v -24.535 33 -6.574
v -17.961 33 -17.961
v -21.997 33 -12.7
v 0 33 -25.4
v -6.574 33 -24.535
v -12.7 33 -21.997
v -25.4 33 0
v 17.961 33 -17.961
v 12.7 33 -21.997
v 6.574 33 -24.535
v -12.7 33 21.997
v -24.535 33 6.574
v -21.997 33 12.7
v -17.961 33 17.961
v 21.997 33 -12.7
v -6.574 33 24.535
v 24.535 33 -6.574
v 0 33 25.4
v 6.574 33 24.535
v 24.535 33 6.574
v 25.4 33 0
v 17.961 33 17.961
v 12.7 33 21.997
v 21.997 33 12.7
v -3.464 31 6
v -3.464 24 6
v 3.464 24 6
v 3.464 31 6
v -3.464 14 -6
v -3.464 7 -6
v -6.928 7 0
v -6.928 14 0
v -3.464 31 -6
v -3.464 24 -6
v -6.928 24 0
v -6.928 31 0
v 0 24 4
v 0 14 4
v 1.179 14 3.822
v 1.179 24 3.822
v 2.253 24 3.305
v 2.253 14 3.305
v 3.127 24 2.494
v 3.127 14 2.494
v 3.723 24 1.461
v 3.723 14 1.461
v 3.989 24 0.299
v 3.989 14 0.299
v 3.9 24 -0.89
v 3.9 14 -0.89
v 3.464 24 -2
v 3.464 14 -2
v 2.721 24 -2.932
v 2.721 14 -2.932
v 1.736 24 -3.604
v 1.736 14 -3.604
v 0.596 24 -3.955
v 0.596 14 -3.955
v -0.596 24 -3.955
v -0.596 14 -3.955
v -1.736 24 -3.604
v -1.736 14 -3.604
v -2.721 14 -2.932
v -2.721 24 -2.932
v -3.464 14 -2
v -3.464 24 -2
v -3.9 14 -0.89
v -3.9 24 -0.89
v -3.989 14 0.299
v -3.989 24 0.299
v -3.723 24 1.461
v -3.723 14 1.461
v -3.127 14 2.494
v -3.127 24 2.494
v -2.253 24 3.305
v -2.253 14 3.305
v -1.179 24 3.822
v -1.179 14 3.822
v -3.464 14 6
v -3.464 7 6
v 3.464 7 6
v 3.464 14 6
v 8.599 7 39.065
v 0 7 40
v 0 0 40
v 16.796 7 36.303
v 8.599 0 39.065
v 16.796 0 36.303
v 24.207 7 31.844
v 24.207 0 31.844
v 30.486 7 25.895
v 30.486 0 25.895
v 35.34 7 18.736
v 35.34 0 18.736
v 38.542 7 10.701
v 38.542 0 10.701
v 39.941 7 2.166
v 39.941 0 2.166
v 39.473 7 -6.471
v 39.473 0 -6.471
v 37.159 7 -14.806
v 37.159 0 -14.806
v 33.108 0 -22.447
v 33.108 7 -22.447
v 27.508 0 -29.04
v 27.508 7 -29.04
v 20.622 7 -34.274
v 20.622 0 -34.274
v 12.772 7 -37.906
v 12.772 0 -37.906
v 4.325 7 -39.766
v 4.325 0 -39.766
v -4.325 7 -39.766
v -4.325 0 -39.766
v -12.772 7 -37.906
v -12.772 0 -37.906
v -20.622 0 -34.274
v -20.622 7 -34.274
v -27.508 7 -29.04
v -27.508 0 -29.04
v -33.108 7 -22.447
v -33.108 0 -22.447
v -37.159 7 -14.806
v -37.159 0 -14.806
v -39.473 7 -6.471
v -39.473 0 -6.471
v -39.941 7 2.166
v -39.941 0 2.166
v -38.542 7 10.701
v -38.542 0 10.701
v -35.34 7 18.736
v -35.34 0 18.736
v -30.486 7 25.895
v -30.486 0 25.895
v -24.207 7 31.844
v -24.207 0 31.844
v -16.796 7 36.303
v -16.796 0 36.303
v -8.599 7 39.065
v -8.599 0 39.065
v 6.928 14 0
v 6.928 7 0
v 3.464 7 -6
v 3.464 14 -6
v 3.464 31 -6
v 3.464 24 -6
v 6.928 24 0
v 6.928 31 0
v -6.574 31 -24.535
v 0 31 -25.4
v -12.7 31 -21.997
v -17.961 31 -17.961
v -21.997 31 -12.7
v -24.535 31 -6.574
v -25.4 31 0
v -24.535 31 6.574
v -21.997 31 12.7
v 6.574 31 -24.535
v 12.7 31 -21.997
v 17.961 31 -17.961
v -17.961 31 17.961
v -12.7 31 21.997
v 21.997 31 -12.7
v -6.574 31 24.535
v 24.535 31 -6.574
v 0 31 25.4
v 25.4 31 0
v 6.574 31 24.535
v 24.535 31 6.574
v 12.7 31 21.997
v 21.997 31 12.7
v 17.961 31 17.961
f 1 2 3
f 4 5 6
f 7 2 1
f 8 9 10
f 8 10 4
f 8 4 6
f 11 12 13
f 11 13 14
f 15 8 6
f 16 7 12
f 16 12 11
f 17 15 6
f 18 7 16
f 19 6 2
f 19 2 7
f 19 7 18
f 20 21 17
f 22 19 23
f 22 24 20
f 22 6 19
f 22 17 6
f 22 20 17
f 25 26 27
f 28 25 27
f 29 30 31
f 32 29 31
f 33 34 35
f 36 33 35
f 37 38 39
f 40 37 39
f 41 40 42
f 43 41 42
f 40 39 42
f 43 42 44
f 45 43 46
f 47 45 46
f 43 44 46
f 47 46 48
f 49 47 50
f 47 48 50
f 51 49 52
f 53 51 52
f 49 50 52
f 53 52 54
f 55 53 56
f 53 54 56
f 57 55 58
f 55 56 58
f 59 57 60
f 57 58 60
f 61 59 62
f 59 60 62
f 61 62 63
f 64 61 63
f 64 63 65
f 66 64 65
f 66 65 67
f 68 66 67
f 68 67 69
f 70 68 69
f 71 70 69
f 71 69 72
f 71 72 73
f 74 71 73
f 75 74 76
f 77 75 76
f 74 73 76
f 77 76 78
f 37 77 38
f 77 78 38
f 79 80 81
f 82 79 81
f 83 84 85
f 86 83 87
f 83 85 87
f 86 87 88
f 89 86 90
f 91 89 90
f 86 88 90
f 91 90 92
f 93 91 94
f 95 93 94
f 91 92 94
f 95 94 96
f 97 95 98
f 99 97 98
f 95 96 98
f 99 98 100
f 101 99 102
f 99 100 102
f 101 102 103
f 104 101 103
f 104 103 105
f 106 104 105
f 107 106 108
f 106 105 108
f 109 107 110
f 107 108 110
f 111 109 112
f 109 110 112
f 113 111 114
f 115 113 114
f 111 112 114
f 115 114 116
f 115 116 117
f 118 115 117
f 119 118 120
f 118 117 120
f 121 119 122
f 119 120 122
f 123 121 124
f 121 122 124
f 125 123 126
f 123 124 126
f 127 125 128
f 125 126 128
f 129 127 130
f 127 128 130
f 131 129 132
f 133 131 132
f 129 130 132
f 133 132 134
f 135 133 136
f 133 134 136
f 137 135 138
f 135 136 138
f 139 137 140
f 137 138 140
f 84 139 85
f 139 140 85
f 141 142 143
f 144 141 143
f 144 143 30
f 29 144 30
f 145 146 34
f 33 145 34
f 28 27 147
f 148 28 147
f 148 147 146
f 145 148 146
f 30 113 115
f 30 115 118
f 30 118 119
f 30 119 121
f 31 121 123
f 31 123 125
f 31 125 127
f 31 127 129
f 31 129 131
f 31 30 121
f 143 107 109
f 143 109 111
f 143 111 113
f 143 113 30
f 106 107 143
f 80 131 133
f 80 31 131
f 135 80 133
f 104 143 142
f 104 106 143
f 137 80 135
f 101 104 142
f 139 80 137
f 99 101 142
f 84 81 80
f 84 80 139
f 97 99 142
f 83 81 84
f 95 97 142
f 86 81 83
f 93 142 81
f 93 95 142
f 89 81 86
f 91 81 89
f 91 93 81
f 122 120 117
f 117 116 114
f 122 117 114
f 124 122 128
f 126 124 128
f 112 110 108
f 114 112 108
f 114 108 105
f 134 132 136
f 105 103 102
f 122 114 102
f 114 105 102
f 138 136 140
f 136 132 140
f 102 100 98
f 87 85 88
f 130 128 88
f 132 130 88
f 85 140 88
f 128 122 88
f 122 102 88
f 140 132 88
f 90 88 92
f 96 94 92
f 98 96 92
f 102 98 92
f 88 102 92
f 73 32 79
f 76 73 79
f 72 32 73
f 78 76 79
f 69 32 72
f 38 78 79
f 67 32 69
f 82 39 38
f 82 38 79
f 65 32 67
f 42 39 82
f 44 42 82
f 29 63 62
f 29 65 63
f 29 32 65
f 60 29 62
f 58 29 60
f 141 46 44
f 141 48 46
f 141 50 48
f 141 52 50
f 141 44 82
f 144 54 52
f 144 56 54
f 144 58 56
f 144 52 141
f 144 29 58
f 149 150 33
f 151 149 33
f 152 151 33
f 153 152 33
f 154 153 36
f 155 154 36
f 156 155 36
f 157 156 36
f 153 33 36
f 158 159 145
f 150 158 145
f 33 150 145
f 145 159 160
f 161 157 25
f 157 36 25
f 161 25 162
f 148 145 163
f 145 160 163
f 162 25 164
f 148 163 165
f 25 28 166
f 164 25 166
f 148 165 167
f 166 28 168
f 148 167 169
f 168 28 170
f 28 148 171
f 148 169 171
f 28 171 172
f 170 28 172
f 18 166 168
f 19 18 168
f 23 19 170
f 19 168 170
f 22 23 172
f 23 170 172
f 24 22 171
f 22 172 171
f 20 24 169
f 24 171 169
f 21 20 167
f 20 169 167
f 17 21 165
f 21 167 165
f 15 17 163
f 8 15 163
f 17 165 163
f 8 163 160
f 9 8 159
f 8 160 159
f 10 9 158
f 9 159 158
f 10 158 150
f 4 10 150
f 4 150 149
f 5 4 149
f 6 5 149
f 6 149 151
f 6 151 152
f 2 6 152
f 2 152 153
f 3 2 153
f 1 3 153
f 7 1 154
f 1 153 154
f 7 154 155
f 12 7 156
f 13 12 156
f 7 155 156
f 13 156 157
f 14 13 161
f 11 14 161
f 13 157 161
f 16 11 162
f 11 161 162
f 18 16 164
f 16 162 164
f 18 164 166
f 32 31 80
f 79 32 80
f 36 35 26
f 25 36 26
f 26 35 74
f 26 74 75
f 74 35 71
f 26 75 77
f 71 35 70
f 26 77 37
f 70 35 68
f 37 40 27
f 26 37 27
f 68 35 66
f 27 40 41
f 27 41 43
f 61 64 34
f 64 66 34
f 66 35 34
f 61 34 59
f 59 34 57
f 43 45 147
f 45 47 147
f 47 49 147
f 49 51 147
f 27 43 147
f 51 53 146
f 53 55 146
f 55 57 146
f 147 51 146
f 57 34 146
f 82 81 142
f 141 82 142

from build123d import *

# Parameters (mm, degrees)
ESBO_O2_R                = 40
RESSALTO_EXTRUS_O1_DEPTH = 7
RESSALTO_EXTRUS_O2_DEPTH = 7
ESBO_O4_R                = 4
RESSALTO_EXTRUS_O3_DEPTH = 10
RESSALTO_EXTRUS_O4_DEPTH = 7
ESBO_O6_R                = 25.4
RESSALTO_EXTRUS_O5_DEPTH = 2


with BuildPart() as part:
    # Esboço2 → Ressalto-extrusão1 (new body)
    with BuildSketch(Plane(origin=(0, 0, 0), x_dir=(1, 0, 0), z_dir=(0, 1, 0))):
        with Locations(Location((0, 0, 0), (0, 0, 270))):
            Circle(ESBO_O2_R)
    extrude(amount=RESSALTO_EXTRUS_O1_DEPTH)

    # Esboço3 → Ressalto-extrusão2 (add)
    with BuildSketch(Plane(origin=(0, 7, 0), x_dir=(1, 0, 0), z_dir=(0, 1, 0))):
        Polygon((6.92820323, 0), (3.464101615, 6), (-3.464101615, 6), (-6.92820323, 0), (-3.464101615, -6), (3.464101615, -6), align=None)
    extrude(amount=RESSALTO_EXTRUS_O2_DEPTH)

    # Esboço4 → Ressalto-extrusão3 (add)
    with BuildSketch(Plane(origin=(0, 14, 0), x_dir=(1, 0, 0), z_dir=(0, 1, 0))):
        with Locations(Location((0, 0, 0), (0, 0, 270))):
            Circle(ESBO_O4_R)
    extrude(amount=RESSALTO_EXTRUS_O3_DEPTH)

    # Esboço5 → Ressalto-extrusão4 (add)
    with BuildSketch(Plane(origin=(0, 24, 0), x_dir=(1, 0, 0), z_dir=(0, 1, 0))):
        Polygon((6.92820323, 0), (3.464101615, 6), (-3.464101615, 6), (-6.92820323, 0), (-3.464101615, -6), (3.464101615, -6), align=None)
    extrude(amount=RESSALTO_EXTRUS_O4_DEPTH)

    # Esboço6 → Ressalto-extrusão5 (add)
    with BuildSketch(Plane(origin=(0, 31, 0), x_dir=(1, 0, 0), z_dir=(0, 1, 0))):
        with Locations(Location((0, 0, 0), (0, 0, 270))):
            Circle(ESBO_O6_R)
    extrude(amount=RESSALTO_EXTRUS_O5_DEPTH)


solid = part.part
